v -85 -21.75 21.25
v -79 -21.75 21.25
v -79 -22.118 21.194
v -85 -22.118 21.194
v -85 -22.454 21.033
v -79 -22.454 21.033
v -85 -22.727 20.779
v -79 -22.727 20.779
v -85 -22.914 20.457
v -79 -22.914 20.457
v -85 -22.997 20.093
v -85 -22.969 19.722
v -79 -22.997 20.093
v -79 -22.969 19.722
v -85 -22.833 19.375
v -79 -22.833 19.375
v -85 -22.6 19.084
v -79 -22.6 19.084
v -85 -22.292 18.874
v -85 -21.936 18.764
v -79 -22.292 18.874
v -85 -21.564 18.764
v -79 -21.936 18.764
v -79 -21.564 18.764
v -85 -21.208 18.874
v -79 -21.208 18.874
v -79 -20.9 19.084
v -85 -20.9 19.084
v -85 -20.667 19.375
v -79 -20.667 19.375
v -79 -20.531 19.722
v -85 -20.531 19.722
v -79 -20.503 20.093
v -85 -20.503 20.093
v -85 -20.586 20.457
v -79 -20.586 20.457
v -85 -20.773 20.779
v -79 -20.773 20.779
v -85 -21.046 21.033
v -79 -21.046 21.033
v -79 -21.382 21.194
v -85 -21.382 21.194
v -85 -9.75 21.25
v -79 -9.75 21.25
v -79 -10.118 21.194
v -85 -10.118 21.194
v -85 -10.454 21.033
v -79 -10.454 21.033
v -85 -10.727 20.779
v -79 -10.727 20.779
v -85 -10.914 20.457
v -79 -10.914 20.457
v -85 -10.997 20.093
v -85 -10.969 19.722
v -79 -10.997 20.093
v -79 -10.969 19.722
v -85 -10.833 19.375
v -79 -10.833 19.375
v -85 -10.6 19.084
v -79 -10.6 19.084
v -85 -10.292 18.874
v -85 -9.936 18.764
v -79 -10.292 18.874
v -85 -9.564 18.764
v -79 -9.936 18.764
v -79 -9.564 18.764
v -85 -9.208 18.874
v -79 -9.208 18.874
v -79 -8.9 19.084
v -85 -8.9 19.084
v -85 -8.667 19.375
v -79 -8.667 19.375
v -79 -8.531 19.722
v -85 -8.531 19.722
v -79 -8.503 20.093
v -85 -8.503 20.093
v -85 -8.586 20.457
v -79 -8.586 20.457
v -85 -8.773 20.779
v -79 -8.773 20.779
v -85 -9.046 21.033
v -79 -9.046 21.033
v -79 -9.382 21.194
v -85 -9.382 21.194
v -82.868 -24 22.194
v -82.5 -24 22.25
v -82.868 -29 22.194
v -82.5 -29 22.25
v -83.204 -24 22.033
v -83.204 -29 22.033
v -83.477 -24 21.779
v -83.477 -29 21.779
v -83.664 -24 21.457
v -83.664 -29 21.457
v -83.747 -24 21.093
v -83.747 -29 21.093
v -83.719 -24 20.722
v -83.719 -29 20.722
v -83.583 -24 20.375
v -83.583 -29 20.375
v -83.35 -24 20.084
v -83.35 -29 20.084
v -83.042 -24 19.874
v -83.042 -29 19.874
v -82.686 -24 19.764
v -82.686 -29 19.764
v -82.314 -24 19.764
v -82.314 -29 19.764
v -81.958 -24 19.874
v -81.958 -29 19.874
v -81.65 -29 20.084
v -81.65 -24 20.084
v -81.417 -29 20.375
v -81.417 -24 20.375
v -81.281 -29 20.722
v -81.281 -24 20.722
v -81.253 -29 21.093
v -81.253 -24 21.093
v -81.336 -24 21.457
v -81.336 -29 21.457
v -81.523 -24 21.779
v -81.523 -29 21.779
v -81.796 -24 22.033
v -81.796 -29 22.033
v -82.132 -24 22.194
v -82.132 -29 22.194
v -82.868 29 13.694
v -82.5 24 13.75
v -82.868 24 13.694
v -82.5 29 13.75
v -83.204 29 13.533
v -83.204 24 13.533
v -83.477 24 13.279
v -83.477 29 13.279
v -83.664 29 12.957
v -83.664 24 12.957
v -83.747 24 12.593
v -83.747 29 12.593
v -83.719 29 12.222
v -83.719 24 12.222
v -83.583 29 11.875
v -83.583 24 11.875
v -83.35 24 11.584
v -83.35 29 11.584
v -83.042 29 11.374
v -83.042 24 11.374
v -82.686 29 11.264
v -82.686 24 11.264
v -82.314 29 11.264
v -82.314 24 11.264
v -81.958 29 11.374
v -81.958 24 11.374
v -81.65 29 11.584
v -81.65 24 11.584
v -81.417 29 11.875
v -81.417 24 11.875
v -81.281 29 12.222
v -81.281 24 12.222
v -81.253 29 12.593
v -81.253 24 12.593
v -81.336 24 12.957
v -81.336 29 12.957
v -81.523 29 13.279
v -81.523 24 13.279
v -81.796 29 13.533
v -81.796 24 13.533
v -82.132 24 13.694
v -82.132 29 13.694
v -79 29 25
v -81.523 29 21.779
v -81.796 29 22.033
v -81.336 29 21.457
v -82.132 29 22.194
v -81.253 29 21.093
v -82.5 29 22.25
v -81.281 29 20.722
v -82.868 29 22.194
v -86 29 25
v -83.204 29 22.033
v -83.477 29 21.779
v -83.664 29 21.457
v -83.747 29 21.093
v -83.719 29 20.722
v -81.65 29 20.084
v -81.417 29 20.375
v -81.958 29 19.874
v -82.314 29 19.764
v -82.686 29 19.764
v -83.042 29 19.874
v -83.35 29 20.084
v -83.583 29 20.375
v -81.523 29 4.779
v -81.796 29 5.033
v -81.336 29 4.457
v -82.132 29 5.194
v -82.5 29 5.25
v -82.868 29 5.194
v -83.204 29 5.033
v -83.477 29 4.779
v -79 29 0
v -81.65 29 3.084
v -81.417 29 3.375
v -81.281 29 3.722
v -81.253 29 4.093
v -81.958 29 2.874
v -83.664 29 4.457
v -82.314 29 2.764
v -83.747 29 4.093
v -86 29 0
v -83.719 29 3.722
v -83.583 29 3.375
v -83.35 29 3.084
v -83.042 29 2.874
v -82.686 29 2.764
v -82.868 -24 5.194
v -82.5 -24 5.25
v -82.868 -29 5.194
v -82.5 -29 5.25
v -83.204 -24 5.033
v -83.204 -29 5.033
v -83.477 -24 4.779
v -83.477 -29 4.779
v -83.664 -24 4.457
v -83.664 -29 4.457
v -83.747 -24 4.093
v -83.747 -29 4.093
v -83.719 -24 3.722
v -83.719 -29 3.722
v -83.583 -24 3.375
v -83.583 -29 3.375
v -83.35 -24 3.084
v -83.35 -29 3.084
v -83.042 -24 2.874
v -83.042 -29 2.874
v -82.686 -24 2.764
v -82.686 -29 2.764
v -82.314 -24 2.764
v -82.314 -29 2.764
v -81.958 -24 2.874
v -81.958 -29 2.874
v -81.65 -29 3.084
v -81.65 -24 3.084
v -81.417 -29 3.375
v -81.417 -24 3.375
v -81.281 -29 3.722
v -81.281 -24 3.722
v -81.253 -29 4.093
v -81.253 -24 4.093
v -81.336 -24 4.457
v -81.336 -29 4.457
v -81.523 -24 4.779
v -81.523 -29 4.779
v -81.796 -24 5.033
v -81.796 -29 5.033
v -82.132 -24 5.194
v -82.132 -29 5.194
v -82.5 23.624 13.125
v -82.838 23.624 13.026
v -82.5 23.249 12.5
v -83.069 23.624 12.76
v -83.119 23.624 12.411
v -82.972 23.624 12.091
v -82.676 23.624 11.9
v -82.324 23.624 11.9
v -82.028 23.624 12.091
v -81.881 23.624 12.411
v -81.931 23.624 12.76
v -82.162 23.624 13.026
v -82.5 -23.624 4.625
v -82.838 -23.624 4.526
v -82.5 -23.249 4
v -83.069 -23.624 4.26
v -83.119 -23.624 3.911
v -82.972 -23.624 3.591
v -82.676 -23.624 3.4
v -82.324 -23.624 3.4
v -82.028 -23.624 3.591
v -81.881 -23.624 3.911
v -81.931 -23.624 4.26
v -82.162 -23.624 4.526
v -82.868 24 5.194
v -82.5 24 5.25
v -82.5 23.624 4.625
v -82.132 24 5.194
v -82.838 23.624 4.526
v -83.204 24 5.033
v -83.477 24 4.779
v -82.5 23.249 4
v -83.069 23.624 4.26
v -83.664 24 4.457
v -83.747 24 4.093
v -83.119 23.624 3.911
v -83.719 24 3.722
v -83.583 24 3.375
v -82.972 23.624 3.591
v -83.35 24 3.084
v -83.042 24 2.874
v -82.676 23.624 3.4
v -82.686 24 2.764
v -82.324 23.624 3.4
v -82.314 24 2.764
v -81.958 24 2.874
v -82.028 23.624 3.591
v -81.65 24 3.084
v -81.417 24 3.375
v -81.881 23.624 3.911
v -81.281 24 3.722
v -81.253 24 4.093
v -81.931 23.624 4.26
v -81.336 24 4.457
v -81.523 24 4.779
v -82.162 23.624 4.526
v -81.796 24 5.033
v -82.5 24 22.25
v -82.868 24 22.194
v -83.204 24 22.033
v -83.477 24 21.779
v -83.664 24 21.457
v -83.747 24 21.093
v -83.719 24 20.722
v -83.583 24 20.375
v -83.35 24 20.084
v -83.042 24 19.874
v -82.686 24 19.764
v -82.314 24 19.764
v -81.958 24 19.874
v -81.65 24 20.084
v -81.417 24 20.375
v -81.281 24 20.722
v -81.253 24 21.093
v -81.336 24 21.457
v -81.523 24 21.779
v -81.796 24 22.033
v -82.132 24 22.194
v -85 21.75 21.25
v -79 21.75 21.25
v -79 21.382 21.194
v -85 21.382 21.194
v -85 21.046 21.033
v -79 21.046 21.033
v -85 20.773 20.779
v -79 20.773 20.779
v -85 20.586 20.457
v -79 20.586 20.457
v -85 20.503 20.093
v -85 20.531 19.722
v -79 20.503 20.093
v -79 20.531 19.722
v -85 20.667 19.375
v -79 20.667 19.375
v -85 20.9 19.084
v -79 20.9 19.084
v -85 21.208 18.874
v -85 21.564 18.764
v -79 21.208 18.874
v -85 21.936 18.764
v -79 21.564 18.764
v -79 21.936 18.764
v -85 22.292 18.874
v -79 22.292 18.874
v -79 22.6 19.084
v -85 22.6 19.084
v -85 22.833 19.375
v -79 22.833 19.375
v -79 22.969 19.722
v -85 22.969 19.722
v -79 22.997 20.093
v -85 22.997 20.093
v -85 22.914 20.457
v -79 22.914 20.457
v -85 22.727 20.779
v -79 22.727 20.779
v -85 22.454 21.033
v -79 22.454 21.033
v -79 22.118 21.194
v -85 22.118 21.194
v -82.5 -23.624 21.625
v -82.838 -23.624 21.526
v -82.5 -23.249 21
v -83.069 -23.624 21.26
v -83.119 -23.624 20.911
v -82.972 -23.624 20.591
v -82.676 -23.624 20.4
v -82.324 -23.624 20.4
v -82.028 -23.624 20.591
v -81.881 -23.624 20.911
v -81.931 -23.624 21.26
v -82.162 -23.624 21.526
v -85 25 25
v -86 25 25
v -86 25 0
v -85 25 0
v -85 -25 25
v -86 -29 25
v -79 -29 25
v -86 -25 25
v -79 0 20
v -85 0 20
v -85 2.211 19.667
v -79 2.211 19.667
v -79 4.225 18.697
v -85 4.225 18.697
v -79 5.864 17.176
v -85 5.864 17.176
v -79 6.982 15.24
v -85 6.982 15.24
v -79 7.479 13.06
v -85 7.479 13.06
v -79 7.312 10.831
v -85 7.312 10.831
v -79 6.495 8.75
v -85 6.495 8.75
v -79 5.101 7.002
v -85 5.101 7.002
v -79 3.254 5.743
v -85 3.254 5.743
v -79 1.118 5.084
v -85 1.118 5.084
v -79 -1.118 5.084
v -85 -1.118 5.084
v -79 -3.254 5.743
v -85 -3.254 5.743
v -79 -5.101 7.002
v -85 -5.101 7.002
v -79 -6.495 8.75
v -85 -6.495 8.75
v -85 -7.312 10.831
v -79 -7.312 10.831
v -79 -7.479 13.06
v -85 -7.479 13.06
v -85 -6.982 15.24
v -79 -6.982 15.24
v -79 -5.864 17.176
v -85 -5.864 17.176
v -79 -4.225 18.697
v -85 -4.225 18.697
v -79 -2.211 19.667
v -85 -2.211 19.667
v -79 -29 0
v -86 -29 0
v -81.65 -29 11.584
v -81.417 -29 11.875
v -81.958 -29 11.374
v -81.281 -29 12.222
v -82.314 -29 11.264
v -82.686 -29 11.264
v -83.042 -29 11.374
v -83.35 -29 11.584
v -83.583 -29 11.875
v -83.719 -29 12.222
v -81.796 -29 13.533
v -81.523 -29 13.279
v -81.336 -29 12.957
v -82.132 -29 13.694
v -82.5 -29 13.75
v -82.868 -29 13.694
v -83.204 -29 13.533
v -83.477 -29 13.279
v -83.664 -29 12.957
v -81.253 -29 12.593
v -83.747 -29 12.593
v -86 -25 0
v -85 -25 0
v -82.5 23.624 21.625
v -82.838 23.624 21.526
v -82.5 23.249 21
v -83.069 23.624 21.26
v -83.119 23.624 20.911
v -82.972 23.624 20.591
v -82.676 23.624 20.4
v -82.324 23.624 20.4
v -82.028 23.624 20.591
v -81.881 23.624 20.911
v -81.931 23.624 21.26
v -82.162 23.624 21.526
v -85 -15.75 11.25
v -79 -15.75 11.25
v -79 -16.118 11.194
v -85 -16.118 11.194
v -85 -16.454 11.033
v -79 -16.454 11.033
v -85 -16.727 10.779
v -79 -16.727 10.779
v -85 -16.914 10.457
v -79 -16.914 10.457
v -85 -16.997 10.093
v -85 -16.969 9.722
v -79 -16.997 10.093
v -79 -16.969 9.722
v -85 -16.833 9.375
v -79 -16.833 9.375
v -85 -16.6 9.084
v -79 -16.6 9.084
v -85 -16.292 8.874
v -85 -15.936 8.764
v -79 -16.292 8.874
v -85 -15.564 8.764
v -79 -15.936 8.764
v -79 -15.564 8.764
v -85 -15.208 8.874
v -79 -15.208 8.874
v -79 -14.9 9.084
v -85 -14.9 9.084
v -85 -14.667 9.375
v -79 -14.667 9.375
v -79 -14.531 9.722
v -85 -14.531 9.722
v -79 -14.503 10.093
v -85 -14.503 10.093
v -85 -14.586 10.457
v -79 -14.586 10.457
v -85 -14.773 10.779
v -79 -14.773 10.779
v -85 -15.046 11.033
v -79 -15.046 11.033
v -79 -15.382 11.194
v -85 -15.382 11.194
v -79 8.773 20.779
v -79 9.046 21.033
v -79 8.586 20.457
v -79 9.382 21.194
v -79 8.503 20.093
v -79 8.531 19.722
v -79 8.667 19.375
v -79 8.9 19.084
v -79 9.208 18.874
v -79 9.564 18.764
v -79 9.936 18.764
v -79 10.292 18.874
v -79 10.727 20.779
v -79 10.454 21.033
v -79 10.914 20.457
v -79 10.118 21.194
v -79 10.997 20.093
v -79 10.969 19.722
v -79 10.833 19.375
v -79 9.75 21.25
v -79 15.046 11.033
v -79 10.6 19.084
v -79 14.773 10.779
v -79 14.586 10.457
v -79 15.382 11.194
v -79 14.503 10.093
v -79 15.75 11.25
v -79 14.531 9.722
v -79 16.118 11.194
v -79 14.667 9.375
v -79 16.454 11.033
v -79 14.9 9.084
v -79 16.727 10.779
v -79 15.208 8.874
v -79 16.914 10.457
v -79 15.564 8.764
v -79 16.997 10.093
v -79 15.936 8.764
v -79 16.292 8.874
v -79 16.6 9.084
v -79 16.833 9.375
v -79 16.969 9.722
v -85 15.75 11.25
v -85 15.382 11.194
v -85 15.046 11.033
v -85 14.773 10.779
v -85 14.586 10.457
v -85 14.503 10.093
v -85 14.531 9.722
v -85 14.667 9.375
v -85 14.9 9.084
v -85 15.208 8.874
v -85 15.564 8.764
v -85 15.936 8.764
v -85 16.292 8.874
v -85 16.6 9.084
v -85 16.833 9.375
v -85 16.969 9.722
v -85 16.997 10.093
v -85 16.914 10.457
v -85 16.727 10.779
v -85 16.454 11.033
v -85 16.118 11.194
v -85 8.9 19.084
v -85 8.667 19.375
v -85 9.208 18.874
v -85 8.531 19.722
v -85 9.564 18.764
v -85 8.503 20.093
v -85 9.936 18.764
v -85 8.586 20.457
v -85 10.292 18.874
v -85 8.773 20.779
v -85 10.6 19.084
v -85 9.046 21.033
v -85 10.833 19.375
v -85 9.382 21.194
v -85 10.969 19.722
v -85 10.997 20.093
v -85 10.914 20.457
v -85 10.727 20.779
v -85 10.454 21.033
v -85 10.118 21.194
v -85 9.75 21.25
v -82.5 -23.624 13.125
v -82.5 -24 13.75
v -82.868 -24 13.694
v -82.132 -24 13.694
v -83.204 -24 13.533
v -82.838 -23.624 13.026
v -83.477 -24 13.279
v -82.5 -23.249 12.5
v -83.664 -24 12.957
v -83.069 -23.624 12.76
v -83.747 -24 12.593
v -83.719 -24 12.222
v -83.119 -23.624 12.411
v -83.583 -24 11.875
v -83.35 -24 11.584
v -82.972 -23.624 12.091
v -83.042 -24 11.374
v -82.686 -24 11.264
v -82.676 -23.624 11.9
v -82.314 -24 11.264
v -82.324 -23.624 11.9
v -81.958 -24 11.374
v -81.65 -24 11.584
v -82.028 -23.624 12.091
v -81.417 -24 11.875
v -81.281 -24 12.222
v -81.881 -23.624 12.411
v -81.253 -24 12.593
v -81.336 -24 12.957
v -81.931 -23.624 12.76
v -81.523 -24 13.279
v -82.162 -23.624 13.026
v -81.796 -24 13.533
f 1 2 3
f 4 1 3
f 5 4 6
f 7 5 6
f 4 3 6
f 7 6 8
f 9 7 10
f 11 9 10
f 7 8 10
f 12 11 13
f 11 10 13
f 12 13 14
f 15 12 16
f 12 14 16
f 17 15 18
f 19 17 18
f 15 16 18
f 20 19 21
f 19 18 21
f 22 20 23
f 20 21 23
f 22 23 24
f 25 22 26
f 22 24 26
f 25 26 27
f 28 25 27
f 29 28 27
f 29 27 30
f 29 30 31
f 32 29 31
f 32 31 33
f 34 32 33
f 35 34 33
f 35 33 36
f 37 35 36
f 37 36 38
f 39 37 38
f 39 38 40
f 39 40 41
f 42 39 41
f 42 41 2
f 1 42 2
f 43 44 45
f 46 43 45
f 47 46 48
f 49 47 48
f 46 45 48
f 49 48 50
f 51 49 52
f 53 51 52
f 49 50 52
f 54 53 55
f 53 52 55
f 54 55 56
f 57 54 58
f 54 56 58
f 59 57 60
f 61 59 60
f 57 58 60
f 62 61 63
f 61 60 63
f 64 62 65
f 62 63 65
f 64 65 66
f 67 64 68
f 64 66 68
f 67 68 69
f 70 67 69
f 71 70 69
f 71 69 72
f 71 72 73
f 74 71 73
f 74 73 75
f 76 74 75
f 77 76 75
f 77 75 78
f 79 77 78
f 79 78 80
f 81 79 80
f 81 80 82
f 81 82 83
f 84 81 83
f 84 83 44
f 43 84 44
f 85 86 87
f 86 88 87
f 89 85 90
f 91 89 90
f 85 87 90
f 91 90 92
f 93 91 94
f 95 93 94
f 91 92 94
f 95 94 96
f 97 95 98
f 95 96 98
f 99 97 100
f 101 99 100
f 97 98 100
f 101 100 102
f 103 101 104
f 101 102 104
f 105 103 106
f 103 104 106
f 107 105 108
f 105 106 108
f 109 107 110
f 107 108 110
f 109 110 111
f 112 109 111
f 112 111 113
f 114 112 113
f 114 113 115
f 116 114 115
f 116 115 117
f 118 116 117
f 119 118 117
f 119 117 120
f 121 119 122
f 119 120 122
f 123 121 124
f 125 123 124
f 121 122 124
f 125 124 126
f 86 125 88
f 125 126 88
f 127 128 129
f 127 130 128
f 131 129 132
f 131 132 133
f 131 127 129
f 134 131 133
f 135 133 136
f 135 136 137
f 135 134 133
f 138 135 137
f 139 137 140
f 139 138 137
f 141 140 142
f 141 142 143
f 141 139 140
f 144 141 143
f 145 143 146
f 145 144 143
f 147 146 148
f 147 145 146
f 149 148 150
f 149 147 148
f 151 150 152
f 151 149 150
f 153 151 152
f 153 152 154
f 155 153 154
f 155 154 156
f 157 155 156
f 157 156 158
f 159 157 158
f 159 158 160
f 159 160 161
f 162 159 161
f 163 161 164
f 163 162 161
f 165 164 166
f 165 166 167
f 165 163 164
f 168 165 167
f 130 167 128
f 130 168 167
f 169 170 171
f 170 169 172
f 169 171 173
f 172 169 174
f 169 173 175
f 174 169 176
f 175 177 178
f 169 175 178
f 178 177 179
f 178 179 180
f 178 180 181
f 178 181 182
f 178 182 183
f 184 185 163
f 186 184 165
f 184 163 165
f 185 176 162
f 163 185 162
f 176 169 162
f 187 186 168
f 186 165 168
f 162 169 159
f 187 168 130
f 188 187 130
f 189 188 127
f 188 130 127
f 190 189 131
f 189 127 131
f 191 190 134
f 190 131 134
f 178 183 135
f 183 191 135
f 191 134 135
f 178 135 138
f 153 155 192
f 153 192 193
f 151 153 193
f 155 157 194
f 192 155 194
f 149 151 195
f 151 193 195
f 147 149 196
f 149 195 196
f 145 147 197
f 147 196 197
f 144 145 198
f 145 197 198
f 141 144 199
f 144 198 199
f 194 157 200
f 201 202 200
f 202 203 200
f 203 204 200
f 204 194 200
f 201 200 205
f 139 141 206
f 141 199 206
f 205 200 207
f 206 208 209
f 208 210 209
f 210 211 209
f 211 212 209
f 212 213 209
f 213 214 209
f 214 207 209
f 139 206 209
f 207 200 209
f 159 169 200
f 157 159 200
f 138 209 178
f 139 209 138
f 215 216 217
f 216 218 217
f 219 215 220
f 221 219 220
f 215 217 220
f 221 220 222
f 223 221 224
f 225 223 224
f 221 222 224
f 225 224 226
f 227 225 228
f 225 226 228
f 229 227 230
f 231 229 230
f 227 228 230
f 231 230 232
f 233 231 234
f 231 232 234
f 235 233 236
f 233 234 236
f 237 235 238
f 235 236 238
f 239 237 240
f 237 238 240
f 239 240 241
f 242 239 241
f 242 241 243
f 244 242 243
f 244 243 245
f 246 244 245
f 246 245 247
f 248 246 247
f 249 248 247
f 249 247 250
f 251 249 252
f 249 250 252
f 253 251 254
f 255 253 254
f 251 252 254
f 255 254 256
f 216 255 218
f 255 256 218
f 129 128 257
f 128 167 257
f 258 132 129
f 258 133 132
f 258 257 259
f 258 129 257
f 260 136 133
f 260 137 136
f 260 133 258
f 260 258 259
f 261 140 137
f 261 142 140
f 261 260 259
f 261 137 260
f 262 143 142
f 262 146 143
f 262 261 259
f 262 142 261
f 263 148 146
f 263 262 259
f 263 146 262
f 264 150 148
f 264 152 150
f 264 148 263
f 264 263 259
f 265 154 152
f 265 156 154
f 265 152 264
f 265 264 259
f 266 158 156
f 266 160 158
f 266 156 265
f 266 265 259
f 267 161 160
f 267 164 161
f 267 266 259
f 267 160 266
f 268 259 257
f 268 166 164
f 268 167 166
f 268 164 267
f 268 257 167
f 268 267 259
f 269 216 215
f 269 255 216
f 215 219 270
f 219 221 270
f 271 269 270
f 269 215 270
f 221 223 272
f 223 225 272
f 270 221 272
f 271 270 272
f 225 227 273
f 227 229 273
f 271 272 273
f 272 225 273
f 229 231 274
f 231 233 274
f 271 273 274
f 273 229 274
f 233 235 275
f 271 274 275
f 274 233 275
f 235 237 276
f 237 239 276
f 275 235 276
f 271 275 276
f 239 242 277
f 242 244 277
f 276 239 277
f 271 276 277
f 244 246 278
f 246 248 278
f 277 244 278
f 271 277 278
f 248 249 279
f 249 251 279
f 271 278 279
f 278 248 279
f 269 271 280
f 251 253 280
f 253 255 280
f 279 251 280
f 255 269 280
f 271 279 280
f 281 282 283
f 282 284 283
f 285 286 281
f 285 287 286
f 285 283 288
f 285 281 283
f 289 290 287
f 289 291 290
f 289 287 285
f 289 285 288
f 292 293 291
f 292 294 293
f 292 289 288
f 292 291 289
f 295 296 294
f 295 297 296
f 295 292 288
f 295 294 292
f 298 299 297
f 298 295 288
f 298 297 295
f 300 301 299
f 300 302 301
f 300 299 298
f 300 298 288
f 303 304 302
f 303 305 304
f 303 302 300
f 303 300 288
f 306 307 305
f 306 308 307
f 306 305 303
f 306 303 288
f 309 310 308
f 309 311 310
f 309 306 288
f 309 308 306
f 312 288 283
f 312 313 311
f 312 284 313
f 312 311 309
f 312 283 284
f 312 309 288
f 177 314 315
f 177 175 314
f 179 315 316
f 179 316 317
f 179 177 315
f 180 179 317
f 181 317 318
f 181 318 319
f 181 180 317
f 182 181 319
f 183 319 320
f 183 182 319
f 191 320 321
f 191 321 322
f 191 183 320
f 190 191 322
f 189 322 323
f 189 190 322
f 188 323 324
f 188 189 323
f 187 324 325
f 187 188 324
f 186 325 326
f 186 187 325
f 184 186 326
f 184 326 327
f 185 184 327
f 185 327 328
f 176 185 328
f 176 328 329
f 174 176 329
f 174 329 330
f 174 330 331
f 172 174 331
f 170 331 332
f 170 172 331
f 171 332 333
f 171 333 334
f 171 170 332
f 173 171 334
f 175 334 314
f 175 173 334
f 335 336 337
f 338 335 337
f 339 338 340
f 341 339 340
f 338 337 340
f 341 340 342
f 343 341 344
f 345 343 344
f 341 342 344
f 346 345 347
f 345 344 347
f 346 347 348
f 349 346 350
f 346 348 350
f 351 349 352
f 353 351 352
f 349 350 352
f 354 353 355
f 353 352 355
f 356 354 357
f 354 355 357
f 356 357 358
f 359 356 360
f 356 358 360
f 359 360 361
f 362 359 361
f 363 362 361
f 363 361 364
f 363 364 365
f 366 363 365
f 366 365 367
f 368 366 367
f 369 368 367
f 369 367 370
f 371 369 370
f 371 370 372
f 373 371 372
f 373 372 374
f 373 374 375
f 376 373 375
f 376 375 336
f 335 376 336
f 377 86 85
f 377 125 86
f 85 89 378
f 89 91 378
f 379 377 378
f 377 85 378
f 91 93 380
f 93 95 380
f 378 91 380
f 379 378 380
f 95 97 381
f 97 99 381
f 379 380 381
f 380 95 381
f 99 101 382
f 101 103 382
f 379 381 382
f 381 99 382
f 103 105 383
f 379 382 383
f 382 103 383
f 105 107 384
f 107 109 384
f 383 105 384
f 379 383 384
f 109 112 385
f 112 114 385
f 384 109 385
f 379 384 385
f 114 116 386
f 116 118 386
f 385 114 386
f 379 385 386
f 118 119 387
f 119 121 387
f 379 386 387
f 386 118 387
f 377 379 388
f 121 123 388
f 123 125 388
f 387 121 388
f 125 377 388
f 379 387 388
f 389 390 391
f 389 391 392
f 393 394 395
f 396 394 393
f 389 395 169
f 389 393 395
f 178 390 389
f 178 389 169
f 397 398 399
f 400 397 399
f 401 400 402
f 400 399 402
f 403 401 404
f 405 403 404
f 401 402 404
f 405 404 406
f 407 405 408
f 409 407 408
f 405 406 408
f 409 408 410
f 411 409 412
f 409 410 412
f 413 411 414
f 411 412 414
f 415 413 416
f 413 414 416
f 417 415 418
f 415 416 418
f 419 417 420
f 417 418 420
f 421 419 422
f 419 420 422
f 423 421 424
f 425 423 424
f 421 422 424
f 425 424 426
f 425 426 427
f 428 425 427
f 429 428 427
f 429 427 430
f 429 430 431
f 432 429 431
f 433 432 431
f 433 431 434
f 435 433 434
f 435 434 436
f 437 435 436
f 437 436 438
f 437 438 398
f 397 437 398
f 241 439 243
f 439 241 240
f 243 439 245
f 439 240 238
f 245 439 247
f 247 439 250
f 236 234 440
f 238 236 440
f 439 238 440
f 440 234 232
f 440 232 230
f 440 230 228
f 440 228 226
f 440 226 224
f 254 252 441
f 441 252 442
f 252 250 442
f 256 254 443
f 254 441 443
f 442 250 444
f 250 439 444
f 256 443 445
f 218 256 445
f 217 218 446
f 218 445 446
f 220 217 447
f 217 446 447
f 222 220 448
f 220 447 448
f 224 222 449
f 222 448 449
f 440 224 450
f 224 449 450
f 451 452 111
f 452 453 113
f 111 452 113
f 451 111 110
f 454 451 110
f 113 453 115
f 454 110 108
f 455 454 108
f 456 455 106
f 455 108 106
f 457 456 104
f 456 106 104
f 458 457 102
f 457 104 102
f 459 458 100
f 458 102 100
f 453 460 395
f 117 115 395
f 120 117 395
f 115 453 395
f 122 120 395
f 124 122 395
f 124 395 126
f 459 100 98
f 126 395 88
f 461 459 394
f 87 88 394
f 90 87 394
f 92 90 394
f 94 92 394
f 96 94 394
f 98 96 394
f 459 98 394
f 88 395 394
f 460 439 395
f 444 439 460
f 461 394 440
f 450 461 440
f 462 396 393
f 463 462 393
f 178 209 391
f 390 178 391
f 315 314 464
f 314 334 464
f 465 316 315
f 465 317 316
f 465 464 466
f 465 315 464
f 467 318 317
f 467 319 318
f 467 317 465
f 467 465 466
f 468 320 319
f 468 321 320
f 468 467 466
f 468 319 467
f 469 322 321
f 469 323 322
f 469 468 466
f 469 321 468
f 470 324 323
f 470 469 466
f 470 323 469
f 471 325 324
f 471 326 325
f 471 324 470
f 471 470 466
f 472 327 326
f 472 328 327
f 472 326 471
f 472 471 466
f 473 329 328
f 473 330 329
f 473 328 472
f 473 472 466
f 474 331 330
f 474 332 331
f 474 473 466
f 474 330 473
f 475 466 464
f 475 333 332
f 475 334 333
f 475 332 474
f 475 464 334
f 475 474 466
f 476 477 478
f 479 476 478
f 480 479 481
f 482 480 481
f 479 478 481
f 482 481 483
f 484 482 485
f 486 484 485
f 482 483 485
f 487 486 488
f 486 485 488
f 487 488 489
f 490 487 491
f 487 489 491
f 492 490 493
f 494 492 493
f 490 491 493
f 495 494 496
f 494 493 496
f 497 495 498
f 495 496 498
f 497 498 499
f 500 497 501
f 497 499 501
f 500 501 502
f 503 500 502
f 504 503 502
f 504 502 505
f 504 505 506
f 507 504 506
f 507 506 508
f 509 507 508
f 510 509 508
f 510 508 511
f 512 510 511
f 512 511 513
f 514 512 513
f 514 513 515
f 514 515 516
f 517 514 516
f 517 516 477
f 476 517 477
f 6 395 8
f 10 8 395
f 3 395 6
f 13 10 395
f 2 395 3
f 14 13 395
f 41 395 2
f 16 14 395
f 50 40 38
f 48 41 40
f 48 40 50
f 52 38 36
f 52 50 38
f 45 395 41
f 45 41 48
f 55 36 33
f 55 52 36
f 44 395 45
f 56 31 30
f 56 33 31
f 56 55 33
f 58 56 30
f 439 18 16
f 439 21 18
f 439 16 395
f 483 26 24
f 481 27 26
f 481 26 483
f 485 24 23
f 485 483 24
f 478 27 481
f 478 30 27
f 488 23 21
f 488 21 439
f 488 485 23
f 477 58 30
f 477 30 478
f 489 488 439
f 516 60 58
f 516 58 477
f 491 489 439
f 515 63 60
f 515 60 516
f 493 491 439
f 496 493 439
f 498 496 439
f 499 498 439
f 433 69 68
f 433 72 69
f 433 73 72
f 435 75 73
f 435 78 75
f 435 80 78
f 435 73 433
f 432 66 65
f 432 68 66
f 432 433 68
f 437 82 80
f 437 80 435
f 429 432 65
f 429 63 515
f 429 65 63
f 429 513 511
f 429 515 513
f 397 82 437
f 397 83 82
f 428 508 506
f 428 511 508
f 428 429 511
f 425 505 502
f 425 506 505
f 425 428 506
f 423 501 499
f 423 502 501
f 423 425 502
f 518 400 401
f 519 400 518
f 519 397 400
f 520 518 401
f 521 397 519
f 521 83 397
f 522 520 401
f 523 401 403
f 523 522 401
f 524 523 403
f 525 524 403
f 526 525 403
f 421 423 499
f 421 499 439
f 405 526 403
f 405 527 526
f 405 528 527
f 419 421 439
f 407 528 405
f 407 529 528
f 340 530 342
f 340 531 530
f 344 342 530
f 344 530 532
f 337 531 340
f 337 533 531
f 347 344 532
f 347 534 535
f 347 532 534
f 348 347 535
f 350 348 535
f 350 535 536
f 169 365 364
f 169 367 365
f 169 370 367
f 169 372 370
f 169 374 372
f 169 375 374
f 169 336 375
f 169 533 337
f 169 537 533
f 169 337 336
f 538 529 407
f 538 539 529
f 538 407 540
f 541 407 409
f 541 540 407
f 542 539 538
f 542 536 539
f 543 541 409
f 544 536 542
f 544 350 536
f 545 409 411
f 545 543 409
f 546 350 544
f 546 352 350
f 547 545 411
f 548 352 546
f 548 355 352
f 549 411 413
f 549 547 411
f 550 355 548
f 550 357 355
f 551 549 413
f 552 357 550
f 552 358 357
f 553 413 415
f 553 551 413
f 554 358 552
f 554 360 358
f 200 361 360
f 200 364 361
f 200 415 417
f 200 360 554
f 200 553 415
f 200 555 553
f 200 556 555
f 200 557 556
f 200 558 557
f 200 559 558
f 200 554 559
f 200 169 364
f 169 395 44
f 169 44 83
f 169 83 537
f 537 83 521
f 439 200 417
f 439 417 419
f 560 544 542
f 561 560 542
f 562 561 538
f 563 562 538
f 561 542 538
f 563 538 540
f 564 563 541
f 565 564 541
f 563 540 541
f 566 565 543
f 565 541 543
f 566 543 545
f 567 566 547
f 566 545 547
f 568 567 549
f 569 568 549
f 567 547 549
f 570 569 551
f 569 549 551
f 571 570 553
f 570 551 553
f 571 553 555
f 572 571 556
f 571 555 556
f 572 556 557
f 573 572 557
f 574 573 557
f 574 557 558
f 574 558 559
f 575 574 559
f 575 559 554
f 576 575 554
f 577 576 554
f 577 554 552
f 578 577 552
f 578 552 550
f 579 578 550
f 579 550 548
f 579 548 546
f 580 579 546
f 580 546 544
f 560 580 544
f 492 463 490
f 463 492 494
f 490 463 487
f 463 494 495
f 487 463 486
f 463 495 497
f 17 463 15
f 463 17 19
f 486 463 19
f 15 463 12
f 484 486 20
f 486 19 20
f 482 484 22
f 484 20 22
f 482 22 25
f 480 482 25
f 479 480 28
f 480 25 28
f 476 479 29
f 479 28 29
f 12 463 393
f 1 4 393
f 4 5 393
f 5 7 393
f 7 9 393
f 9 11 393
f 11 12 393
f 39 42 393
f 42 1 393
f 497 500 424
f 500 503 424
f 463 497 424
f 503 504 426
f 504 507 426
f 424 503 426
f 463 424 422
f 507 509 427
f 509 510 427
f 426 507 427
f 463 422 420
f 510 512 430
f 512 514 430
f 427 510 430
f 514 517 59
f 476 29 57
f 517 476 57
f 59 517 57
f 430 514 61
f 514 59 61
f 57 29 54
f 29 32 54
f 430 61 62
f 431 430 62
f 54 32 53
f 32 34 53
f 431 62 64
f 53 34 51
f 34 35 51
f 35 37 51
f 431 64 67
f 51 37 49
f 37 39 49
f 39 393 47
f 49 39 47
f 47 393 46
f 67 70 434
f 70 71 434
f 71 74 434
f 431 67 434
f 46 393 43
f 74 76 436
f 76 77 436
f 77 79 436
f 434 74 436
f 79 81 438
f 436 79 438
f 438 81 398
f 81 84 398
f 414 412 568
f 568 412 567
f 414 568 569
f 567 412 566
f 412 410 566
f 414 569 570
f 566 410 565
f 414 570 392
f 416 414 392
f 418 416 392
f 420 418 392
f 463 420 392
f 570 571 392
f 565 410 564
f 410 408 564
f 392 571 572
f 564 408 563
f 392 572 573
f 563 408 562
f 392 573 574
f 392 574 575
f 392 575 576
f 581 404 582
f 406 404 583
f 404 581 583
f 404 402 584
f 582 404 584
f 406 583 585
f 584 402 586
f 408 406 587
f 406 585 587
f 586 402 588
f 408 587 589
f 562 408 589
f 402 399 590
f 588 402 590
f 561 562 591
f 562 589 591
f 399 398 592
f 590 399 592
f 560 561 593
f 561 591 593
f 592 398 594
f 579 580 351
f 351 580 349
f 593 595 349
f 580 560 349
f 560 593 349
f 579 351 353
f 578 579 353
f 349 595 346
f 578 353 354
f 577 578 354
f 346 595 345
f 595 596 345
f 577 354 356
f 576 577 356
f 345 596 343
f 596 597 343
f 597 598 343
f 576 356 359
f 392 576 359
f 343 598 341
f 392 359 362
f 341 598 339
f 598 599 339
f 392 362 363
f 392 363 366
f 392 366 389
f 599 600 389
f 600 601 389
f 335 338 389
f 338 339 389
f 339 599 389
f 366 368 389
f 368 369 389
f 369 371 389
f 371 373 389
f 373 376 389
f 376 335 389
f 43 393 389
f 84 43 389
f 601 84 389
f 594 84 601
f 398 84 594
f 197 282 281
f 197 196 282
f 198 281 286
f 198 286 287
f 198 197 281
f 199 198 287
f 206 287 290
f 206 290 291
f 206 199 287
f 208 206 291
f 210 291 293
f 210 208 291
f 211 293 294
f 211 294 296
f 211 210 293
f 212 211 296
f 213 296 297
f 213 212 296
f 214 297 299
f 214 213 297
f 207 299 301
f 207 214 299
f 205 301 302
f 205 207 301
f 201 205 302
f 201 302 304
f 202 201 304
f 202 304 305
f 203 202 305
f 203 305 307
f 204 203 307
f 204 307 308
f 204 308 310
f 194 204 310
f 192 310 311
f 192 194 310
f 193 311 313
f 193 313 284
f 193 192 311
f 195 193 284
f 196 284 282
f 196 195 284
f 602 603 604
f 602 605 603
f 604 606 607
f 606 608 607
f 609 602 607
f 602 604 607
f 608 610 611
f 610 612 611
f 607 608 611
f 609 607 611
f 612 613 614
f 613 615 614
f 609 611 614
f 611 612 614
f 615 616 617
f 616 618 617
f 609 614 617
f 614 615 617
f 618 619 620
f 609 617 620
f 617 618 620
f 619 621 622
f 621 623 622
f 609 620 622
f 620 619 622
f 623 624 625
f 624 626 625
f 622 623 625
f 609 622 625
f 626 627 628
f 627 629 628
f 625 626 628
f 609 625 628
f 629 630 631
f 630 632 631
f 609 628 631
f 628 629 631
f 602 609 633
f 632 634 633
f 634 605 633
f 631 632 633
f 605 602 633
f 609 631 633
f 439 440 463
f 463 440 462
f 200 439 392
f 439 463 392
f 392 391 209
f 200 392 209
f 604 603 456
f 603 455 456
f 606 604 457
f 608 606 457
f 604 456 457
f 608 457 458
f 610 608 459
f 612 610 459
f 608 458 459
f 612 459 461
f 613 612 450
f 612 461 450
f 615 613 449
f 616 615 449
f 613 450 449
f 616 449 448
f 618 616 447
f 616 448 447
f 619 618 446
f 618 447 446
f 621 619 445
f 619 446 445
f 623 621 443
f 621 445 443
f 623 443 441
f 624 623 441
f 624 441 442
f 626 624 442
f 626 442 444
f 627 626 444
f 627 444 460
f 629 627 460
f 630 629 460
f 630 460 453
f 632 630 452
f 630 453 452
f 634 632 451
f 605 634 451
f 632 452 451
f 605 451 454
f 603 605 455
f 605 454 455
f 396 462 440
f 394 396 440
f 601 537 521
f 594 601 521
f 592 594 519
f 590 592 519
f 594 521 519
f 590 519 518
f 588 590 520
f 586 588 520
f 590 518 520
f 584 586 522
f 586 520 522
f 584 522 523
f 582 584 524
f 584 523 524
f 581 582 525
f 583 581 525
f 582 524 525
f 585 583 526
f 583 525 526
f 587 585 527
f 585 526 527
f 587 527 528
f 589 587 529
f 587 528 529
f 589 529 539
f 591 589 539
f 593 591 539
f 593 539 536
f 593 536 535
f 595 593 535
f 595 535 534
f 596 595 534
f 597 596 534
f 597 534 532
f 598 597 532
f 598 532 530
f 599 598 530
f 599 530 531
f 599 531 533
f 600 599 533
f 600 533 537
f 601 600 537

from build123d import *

# Parameters (mm, degrees)
EXTRUDE_1_DEPTH             = 25
SKETCH_2_W                  = 1
SKETCH_2_H                  = 50
CUT_EXTRUDE_1_DEPTH         = 26
SKETCH_3_W                  = 52
SKETCH_3_H                  = 1
EXTRUDE_2_DEPTH             = 25
SKETCH_4_W                  = 2
SKETCH_4_H                  = 1
EXTRUDE_3_DEPTH             = 25
SKETCH_5_W                  = 2
SKETCH_5_H                  = 1
EXTRUDE_4_DEPTH             = 25
SKETCH_6_W                  = 11
SKETCH_6_H                  = 1
CUT_EXTRUDE_2_DEPTH         = 26
SKETCH_7_R                  = 8.5
CUT_EXTRUDE_3_DEPTH         = 64
SKETCH_8_R                  = 9.5
CUT_EXTRUDE_4_DEPTH         = 5
SKETCH_9_W                  = 2
SKETCH_9_H                  = 5
EXTRUDE_5_DEPTH             = 25
HOLE_WIZARD_1_D             = 3.4
HOLE_WIZARD_1_DEPTH         = 5
HOLE_WIZARD_1_CBORE_D       = 6
HOLE_WIZARD_1_CBORE_DEPTH   = 3
SKETCH_14_R                 = 1.5
CUT_EXTRUDE_8_DEPTH         = 5
SKETCH_22_W                 = 25
SKETCH_22_H                 = 52
EXTRUDE_9_DEPTH             = 2
CUT_EXTRUDE_START           = -6
CUT_EXTRUDE_10_DEPTH        = 6
CUT_EXTRUDE_11_REACH        = 173
SKETCH_17_R                 = 7.5
CUT_EXTRUDE_12_DEPTH        = 60
HOLE_WIZARD_M3_1_D          = 2.5
HOLE_WIZARD_M3_1_DEPTH      = 8.5
HOLE_WIZARD_M3_1_TIP        = 0.751075774
HOLE_WIZARD_M3_2_AT_2_COUNT = 2
HOLE_WIZARD_M3_2_AT_2_PITCH = 8.5
HOLE_WIZARD_M3_2_AT_3_COUNT = 2
HOLE_WIZARD_M3_2_AT_3_PITCH = 17


with BuildPart() as part:
    # 草图1 → 凸台-拉伸1 (new body)
    with BuildSketch(Plane.XY):
        Polygon((-81, -29), (86, -29), (86, -34), (-86, -34), (-86, -29), (-86, 29), (-81, 29), align=None)
    extrude(amount=EXTRUDE_1_DEPTH)

    # 草图2 → 切除-拉伸1 (cut, through all)
    with BuildSketch(Plane.XY.offset(25)):
        with Locations((-85.5, 0)):
            Rectangle(SKETCH_2_W, SKETCH_2_H)
    extrude(amount=-CUT_EXTRUDE_1_DEPTH, mode=Mode.SUBTRACT)

    # 草图3 → 凸台-拉伸2 (add)
    with BuildSketch(Plane.XY.offset(25)):
        with Locations((0, -28.5)):
            Rectangle(SKETCH_3_W, SKETCH_3_H)
    extrude(amount=-EXTRUDE_2_DEPTH)

    # 草图4 → 凸台-拉伸3 (add)
    with BuildSketch(Plane.XY.offset(25)):
        with Locations((-80, -28.5)):
            Rectangle(SKETCH_4_W, SKETCH_4_H)
    extrude(amount=-EXTRUDE_3_DEPTH)

    # 草图5 → 凸台-拉伸4 (add)
    with BuildSketch(Plane.XY.offset(25)):
        with Locations((78, -28.5)):
            Rectangle(SKETCH_5_W, SKETCH_5_H)
    extrude(amount=-EXTRUDE_4_DEPTH)

    # 草图6 → 切除-拉伸2 (cut, through all)
    with BuildSketch(Plane.XY.offset(25)):
        with Locations((-20.5, -33.5)):
            Rectangle(SKETCH_6_W, SKETCH_6_H)
    cut_extrude_2 = extrude(amount=-CUT_EXTRUDE_2_DEPTH, mode=Mode.SUBTRACT)

    # 镜向1: 切除-拉伸2 across plane
    add(cut_extrude_2.mirror(Plane(origin=(0, 0, 0), x_dir=(0, 0, 1), z_dir=(1, 0, 0))), mode=Mode.SUBTRACT)

    # 草图7 → 切除-拉伸3 (cut, through all)
    with BuildSketch(Plane.XZ.offset(34)):
        with Locations((0, 12.5)):
            Circle(SKETCH_7_R)
    extrude(amount=-CUT_EXTRUDE_3_DEPTH, mode=Mode.SUBTRACT)

    # 草图8 → 切除-拉伸4 (cut)
    with BuildSketch(Plane(origin=(0, -28, 0), x_dir=(1, 0, 0), z_dir=(0, 1, 0))):
        with Locations((0, -12.5)):
            Circle(SKETCH_8_R)
    extrude(amount=-CUT_EXTRUDE_4_DEPTH, mode=Mode.SUBTRACT)

    # 草图9 → 凸台-拉伸5 (add)
    with BuildSketch(Plane(origin=(0, 0, 0), x_dir=(-1, 0, 0), z_dir=(0, 0, -1))):
        with Locations((80, 26.5)):
            Rectangle(SKETCH_9_W, SKETCH_9_H)
    extrude(amount=-EXTRUDE_5_DEPTH)

    # 孔1
    with Locations(Plane(origin=(82.5, -34, 21), x_dir=(-1, 0, 0), z_dir=(0, -1, 0))):
        with Locations((0, 0), (0, 8.5), (0, 17)):
            CounterBoreHole(HOLE_WIZARD_1_D / 2, HOLE_WIZARD_1_CBORE_D / 2, HOLE_WIZARD_1_CBORE_DEPTH, depth=HOLE_WIZARD_1_DEPTH)

    # 草图14 → 切除-拉伸8 (cut)
    with BuildSketch(Plane.XZ.offset(33)):
        with Locations((-23, 20)):
            Circle(SKETCH_14_R)
        with Locations((-23, 5)):
            Circle(SKETCH_14_R)
    cut_extrude_8 = extrude(amount=-CUT_EXTRUDE_8_DEPTH, mode=Mode.SUBTRACT)

    # 镜向2: 切除-拉伸8 across plane
    add(cut_extrude_8.mirror(Plane(origin=(0, 0, 0), x_dir=(0, 0, 1), z_dir=(1, 0, 0))), mode=Mode.SUBTRACT)

    # 草图22 → 凸台-拉伸9 (add)
    with BuildSketch(Plane(origin=(-81, 0, 0), x_dir=(0, 0, -1), z_dir=(1, 0, 0))):
        with Locations((-12.5, -2)):
            Rectangle(SKETCH_22_W, SKETCH_22_H)
    extrude(amount=EXTRUDE_9_DEPTH)

    # 草图16 → 切除-拉伸10 (cut)
    with BuildSketch(Plane.XZ.offset(34).offset(CUT_EXTRUDE_START)):
        with BuildLine():
            Line((-73, 20), (-30, 20))
            ThreePointArc((-30, 20), (-26.464466094, 18.535533906), (-25, 15))
            Line((-25, 15), (-25, 10))
            ThreePointArc((-25, 10), (-26.464466094, 6.464466094), (-30, 5))
            Line((-30, 5), (-73, 5))
            ThreePointArc((-73, 5), (-76.535533906, 6.464466094), (-78, 10))
            Line((-78, 10), (-78, 15))
            ThreePointArc((-78, 15), (-76.535533906, 18.535533906), (-73, 20))
        make_face()
    cut_extrude_10 = extrude(amount=CUT_EXTRUDE_10_DEPTH, mode=Mode.SUBTRACT)

    # 镜向3: 切除-拉伸10 across plane
    add(cut_extrude_10.mirror(Plane(origin=(0, 0, 0), x_dir=(0, 0, 1), z_dir=(1, 0, 0))), mode=Mode.SUBTRACT)

    # 草图17 → 切除-拉伸11 (cut, up to next)
    with BuildSketch(Plane.ZY.offset(85), mode=Mode.PRIVATE) as cut_extrude_11_sk1:
        with Locations((12.5, 0)):
            Circle(SKETCH_17_R)
    cut_extrude_11_tool1 = extrude(cut_extrude_11_sk1.sketch, amount=-CUT_EXTRUDE_11_REACH, mode=Mode.PRIVATE) & part.part
    add(cut_extrude_11_tool1.solids().sort_by_distance((-85, 0, 12.5))[0], mode=Mode.SUBTRACT)

    # 草图18 → 切除-拉伸12 (cut)
    with BuildSketch(Plane.XY.offset(25)):
        Polygon((-79, -29), (-86, -29), (-86, -34), (86, -34), (86, -25.759087468), (-79, -25.759087468), align=None)
    extrude(amount=-CUT_EXTRUDE_12_DEPTH, mode=Mode.SUBTRACT)

    # M3 螺纹孔1
    with Locations(Plane(origin=(-85, 21.75, 20), x_dir=(0, 0, -1), z_dir=(-1, 0, 0))):
        with Locations((0, 0), (0, 12), (10, 6), (0, 31.5), (0, 43.5), (10, 37.5)):
            Hole(HOLE_WIZARD_M3_1_D / 2, depth=HOLE_WIZARD_M3_1_DEPTH)
            with Locations((0, 0, -(HOLE_WIZARD_M3_1_DEPTH + HOLE_WIZARD_M3_1_TIP / 2))):  # 118° drill point
                Cone(0, HOLE_WIZARD_M3_1_D / 2, HOLE_WIZARD_M3_1_TIP, mode=Mode.SUBTRACT)

    # 草图24 → M3 螺纹孔2 (revolve, cut)
    with BuildSketch(Plane(origin=(-82.5, 29, 21), x_dir=(0, 0, 1), z_dir=(1, 0, 0))):
        Polygon((0, 0), (0, 5.751075774), (1.25, 5), (1.25, 0), align=None)
    hole_wizard_m3_2 = revolve(axis=Axis((-82.5, 35.35, 21), (0, -1, 0)), mode=Mode.SUBTRACT)

    # M3 螺纹孔2 at 2: M3 螺纹孔2 ×2
    with Locations(*[(0, 0, -i * HOLE_WIZARD_M3_2_AT_2_PITCH) for i in range(1, HOLE_WIZARD_M3_2_AT_2_COUNT)]):
        add(hole_wizard_m3_2, mode=Mode.SUBTRACT)

    # M3 螺纹孔2 at 3: M3 螺纹孔2 ×2
    with Locations(*[(0, 0, -i * HOLE_WIZARD_M3_2_AT_3_PITCH) for i in range(1, HOLE_WIZARD_M3_2_AT_3_COUNT)]):
        add(hole_wizard_m3_2, mode=Mode.SUBTRACT)

    # 镜向4: M3 螺纹孔2 across plane
    add(hole_wizard_m3_2.mirror(Plane.ZX), mode=Mode.SUBTRACT)

    # 镜向4 copy 1 sketch → 镜向4 copy 1 (revolve, cut)
    with BuildSketch(Plane(origin=(-82.5, -29, 12.5), x_dir=(0, 0, 1), z_dir=(1, 0, 0))):
        Polygon((0, 0), (0, -5.751075774), (1.25, -5), (1.25, 0), align=None)
    revolve(axis=Axis((-82.5, -35.35, 12.5), (0, -1, 0)), mode=Mode.SUBTRACT)

    # 镜向4 copy 2 sketch → 镜向4 copy 2 (revolve, cut)
    with BuildSketch(Plane(origin=(-82.5, -29, 4), x_dir=(0, 0, 1), z_dir=(1, 0, 0))):
        Polygon((0, 0), (0, -5.751075774), (1.25, -5), (1.25, 0), align=None)
    revolve(axis=Axis((-82.5, -35.35, 4), (0, -1, 0)), mode=Mode.SUBTRACT)


solid = part.part
